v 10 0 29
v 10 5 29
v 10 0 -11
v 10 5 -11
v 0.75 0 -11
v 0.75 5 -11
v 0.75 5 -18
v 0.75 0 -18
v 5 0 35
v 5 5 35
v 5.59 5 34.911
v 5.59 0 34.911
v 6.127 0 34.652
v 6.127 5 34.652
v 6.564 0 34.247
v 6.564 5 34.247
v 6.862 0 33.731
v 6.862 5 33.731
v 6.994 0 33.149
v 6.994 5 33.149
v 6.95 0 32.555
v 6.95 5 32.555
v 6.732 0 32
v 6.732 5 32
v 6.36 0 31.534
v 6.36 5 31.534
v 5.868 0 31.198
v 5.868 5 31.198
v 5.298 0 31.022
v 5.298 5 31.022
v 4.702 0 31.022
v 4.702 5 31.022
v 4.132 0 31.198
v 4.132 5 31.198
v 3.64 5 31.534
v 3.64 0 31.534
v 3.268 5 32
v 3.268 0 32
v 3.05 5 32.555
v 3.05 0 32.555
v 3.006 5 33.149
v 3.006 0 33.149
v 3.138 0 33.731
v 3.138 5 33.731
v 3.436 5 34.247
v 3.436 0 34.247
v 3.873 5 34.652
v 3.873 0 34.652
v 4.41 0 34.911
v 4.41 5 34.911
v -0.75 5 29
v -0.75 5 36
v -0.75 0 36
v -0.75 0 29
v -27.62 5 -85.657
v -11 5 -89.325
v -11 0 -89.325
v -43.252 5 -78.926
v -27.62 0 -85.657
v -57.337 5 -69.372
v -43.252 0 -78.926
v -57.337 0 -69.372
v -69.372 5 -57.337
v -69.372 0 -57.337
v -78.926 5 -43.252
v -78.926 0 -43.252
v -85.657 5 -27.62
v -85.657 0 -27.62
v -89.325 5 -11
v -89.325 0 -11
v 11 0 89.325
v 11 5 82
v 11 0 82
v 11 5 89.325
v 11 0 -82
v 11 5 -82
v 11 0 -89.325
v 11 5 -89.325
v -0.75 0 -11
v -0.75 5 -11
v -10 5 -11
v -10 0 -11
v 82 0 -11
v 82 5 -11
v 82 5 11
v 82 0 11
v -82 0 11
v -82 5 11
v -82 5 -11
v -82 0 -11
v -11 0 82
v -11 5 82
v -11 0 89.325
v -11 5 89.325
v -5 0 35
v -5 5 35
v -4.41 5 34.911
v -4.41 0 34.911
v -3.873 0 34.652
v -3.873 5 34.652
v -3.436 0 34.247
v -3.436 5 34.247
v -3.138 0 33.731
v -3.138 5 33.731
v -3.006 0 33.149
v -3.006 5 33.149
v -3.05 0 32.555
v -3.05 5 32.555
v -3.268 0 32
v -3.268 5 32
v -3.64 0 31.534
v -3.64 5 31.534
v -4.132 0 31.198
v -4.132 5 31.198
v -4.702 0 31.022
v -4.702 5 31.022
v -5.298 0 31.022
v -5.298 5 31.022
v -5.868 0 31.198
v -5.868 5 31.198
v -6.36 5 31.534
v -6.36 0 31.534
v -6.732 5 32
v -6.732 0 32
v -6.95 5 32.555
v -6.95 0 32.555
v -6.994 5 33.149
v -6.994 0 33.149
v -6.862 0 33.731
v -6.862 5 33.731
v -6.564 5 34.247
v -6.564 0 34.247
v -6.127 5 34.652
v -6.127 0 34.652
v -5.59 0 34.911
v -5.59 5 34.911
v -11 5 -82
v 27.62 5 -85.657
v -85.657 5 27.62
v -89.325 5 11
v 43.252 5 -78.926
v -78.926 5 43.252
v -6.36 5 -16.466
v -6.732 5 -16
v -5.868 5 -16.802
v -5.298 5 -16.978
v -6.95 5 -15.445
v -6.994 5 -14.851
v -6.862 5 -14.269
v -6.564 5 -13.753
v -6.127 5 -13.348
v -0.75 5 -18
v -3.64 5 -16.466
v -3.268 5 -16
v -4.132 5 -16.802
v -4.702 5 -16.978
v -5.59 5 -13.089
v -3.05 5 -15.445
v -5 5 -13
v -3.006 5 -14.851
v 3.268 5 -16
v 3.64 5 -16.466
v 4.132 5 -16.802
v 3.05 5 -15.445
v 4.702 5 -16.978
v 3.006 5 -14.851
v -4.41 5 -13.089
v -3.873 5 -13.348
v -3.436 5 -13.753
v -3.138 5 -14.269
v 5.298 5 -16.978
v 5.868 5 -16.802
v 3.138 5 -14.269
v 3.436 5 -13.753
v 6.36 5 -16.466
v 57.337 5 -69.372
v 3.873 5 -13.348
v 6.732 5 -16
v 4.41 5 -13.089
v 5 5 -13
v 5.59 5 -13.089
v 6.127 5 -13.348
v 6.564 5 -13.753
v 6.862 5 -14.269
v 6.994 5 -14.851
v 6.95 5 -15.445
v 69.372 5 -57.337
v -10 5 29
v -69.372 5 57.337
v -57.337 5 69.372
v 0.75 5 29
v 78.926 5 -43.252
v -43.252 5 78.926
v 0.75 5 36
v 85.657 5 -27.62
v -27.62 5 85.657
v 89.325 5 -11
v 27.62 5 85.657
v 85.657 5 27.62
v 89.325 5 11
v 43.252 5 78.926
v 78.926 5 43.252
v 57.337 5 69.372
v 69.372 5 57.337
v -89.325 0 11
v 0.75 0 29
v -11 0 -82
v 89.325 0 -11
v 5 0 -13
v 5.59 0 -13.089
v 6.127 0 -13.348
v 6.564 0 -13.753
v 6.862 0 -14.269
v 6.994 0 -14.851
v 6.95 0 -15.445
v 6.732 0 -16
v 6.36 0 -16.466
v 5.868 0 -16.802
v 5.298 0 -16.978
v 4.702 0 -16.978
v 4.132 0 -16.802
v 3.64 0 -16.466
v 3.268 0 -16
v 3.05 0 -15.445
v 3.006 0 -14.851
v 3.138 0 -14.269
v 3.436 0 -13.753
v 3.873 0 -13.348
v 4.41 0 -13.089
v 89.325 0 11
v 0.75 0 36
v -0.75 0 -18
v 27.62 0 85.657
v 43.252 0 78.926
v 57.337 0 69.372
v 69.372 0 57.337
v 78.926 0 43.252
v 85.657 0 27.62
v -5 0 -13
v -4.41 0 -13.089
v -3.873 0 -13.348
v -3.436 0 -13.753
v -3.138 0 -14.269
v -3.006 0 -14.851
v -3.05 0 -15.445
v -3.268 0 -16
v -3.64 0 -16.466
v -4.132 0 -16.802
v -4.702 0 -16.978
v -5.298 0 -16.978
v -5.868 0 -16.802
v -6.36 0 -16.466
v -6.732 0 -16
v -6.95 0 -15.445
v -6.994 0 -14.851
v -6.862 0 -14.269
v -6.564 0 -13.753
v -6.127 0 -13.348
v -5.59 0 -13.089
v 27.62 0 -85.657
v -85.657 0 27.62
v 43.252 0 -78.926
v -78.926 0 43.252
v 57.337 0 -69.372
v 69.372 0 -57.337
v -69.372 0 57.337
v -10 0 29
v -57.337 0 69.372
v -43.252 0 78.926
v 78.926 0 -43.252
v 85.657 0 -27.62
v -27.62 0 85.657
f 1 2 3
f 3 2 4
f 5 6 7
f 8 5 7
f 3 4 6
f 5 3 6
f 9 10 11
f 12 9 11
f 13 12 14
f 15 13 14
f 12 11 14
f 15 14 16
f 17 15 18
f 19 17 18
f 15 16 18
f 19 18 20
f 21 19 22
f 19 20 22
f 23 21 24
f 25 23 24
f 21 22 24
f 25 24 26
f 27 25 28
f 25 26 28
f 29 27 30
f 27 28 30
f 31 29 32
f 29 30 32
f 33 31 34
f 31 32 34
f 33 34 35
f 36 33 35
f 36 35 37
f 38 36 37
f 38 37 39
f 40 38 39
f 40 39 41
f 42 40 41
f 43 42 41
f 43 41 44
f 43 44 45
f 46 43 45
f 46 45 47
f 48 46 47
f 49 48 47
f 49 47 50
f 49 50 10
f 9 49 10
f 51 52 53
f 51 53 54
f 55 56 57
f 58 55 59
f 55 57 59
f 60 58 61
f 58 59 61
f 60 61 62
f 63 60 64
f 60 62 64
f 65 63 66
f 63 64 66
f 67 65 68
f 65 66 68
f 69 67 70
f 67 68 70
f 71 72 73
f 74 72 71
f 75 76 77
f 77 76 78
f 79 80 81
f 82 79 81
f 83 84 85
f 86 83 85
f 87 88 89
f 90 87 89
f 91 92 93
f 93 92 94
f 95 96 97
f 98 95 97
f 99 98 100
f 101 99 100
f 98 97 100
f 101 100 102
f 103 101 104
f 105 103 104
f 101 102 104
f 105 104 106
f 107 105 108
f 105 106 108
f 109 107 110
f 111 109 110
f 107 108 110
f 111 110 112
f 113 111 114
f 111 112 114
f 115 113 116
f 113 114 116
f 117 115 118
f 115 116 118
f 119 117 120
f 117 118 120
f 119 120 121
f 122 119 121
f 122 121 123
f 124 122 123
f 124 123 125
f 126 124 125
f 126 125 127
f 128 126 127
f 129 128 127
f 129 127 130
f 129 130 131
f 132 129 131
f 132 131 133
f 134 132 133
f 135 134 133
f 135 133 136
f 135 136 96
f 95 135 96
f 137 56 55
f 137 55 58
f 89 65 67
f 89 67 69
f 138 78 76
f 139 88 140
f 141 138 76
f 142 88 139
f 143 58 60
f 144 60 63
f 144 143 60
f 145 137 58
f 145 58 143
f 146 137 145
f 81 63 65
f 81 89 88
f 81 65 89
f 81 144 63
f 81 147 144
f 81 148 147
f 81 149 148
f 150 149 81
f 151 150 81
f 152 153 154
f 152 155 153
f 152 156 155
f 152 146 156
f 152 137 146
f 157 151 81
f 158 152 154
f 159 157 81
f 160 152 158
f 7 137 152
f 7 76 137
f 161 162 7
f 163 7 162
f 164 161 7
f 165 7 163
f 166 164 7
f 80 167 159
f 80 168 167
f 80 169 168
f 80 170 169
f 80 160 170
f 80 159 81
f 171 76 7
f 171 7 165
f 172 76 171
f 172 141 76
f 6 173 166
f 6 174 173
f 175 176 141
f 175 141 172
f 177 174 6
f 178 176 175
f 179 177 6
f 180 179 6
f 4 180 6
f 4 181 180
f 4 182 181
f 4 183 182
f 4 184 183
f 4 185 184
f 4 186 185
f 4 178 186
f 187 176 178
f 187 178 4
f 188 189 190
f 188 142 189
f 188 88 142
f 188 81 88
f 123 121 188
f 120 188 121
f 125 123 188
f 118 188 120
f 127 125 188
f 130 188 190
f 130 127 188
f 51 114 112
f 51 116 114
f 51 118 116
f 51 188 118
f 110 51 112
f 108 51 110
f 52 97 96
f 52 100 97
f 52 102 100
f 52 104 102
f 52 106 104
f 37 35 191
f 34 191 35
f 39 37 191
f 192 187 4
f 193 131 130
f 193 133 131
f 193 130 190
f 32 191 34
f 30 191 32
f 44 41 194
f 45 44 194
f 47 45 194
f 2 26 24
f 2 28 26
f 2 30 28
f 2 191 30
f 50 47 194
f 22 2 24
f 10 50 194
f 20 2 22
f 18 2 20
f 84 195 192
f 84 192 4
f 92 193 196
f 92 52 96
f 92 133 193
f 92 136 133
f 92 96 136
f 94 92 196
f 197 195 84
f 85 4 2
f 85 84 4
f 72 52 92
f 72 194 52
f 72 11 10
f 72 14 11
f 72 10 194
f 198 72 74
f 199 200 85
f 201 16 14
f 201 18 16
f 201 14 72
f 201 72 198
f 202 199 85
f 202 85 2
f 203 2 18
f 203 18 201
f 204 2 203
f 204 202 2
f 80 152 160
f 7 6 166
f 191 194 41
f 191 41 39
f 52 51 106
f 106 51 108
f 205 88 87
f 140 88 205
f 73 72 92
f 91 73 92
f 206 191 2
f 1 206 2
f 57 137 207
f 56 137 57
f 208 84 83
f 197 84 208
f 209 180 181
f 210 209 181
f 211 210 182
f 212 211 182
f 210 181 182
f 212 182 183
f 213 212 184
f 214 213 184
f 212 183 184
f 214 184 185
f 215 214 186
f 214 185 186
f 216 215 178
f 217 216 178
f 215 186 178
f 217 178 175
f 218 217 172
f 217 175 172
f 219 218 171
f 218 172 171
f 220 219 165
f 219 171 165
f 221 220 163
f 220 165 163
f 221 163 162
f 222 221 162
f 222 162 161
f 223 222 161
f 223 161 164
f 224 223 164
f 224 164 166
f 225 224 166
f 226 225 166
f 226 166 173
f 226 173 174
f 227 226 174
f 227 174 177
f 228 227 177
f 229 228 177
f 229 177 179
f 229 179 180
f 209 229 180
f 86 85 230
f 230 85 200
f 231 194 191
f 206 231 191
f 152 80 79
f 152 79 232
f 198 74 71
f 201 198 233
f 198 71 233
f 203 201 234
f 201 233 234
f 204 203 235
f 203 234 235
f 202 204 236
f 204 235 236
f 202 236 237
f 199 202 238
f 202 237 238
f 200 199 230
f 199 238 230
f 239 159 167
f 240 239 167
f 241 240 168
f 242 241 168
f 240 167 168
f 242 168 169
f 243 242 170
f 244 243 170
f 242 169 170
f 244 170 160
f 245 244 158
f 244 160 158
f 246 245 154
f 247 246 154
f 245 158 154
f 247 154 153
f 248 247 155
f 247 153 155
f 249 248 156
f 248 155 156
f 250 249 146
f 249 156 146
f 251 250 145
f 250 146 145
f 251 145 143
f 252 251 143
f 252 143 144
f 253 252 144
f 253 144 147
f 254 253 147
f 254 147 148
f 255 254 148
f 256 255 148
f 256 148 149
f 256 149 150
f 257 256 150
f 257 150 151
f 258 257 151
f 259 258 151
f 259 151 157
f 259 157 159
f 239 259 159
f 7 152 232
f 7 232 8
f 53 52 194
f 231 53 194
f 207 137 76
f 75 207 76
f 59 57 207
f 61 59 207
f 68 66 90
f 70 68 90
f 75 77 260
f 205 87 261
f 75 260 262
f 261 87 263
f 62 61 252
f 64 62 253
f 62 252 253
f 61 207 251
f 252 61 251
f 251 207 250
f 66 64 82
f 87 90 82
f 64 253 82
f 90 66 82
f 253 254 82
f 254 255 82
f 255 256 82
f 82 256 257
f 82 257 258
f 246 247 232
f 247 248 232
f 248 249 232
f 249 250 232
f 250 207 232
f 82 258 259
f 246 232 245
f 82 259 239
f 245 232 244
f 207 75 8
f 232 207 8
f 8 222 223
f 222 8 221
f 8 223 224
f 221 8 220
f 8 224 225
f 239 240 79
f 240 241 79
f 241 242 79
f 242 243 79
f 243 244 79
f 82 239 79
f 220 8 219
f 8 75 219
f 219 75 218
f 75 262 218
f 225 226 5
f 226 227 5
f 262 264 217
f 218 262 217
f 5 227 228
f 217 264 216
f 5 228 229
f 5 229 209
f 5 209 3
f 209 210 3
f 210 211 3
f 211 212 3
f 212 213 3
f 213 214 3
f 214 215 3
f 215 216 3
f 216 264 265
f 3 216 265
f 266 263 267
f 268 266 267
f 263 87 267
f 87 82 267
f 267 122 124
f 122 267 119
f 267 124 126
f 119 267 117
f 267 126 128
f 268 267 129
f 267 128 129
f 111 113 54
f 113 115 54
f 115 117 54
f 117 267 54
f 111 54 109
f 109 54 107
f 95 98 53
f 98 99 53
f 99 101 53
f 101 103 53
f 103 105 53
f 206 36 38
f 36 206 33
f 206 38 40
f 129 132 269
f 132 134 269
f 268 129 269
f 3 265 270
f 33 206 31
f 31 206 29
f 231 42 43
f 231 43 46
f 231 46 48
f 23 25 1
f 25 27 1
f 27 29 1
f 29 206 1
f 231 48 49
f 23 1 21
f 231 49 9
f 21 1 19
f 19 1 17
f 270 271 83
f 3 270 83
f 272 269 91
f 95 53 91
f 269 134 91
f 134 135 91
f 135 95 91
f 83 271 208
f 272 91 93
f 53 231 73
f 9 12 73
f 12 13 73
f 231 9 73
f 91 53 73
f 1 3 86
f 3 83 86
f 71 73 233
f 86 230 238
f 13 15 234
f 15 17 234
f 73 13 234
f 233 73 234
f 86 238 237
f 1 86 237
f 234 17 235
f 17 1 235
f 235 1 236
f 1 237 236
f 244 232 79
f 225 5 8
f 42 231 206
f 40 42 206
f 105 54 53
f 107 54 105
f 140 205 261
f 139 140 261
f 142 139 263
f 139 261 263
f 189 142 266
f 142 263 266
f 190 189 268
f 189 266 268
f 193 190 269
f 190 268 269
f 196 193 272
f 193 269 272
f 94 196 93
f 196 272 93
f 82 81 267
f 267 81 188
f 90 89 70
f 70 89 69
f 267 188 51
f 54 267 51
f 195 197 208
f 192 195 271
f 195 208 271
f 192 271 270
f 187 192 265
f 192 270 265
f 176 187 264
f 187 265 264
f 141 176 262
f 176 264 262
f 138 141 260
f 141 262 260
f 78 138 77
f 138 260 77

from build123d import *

# Parameters (mm, degrees)
SKETCH1_R           = 90
BOSS_EXTRUDE1_DEPTH = 5
SKETCH2_W           = 22
SKETCH2_H           = 25.485580708
CUT_EXTRUDE1_DEPTH  = 10
CIRPATTERN3_COUNT   = 4
SKETCH3_W           = 1.5
SKETCH3_H           = 7
SKETCH3_R           = 2
CUT_EXTRUDE2_DEPTH  = 10


with BuildPart() as part:
    # Sketch1 → Boss-Extrude1 (new body)
    with BuildSketch(Plane(origin=(0, 0, 0), x_dir=(1, 0, 0), z_dir=(0, 1, 0))):
        with Locations(Location((0, 0, 0), (0, 0, 270))):
            Circle(SKETCH1_R)
    extrude(amount=BOSS_EXTRUDE1_DEPTH)

    # Sketch2 → Cut-Extrude1 (cut)
    with BuildSketch(Plane(origin=(0, 5, 0), x_dir=(1, 0, 0), z_dir=(0, 1, 0))):
        with Locations((0, 94.742790354)):
            Rectangle(SKETCH2_W, SKETCH2_H)
    cut_extrude1 = extrude(amount=-CUT_EXTRUDE1_DEPTH, mode=Mode.SUBTRACT)

    # CirPattern3: Cut-Extrude1 ×4 about axis
    cirpattern3_axis = Axis((0, 0, 0), (0, 1, 0))
    for i in range(1, CIRPATTERN3_COUNT):
        add(cut_extrude1.rotate(cirpattern3_axis, i * 360 / CIRPATTERN3_COUNT), mode=Mode.SUBTRACT)

    # Sketch3 → Cut-Extrude2 (cut)
    with BuildSketch(Plane(origin=(0, 5, 0), x_dir=(1, 0, 0), z_dir=(0, 1, 0))):
        Polygon((10, -9), (-10, -9), (-10, -29), (-0.75, -29), (0.75, -29), (10, -29), align=None)
        with Locations((0, -32.5)):
            Rectangle(SKETCH3_W, SKETCH3_H)
        with Locations(Location((5, -33, 0), (0, 0, 270))):
            Circle(SKETCH3_R)
        with Locations(Location((-5, -33, 0), (0, 0, 270))):
            Circle(SKETCH3_R)
        Polygon((-0.75, 11), (-10, 11), (-10, -9), (10, -9), (10, 11), (0.75, 11), align=None)
        with Locations(Location((-5, 15, 0), (0, 0, 270))):
            Circle(SKETCH3_R)
        with Locations((0, 14.5)):
            Rectangle(SKETCH3_W, SKETCH3_H)
        with Locations(Location((5, 15, 0), (0, 0, 270))):
            Circle(SKETCH3_R)
    extrude(amount=-CUT_EXTRUDE2_DEPTH, mode=Mode.SUBTRACT)


solid = part.part
